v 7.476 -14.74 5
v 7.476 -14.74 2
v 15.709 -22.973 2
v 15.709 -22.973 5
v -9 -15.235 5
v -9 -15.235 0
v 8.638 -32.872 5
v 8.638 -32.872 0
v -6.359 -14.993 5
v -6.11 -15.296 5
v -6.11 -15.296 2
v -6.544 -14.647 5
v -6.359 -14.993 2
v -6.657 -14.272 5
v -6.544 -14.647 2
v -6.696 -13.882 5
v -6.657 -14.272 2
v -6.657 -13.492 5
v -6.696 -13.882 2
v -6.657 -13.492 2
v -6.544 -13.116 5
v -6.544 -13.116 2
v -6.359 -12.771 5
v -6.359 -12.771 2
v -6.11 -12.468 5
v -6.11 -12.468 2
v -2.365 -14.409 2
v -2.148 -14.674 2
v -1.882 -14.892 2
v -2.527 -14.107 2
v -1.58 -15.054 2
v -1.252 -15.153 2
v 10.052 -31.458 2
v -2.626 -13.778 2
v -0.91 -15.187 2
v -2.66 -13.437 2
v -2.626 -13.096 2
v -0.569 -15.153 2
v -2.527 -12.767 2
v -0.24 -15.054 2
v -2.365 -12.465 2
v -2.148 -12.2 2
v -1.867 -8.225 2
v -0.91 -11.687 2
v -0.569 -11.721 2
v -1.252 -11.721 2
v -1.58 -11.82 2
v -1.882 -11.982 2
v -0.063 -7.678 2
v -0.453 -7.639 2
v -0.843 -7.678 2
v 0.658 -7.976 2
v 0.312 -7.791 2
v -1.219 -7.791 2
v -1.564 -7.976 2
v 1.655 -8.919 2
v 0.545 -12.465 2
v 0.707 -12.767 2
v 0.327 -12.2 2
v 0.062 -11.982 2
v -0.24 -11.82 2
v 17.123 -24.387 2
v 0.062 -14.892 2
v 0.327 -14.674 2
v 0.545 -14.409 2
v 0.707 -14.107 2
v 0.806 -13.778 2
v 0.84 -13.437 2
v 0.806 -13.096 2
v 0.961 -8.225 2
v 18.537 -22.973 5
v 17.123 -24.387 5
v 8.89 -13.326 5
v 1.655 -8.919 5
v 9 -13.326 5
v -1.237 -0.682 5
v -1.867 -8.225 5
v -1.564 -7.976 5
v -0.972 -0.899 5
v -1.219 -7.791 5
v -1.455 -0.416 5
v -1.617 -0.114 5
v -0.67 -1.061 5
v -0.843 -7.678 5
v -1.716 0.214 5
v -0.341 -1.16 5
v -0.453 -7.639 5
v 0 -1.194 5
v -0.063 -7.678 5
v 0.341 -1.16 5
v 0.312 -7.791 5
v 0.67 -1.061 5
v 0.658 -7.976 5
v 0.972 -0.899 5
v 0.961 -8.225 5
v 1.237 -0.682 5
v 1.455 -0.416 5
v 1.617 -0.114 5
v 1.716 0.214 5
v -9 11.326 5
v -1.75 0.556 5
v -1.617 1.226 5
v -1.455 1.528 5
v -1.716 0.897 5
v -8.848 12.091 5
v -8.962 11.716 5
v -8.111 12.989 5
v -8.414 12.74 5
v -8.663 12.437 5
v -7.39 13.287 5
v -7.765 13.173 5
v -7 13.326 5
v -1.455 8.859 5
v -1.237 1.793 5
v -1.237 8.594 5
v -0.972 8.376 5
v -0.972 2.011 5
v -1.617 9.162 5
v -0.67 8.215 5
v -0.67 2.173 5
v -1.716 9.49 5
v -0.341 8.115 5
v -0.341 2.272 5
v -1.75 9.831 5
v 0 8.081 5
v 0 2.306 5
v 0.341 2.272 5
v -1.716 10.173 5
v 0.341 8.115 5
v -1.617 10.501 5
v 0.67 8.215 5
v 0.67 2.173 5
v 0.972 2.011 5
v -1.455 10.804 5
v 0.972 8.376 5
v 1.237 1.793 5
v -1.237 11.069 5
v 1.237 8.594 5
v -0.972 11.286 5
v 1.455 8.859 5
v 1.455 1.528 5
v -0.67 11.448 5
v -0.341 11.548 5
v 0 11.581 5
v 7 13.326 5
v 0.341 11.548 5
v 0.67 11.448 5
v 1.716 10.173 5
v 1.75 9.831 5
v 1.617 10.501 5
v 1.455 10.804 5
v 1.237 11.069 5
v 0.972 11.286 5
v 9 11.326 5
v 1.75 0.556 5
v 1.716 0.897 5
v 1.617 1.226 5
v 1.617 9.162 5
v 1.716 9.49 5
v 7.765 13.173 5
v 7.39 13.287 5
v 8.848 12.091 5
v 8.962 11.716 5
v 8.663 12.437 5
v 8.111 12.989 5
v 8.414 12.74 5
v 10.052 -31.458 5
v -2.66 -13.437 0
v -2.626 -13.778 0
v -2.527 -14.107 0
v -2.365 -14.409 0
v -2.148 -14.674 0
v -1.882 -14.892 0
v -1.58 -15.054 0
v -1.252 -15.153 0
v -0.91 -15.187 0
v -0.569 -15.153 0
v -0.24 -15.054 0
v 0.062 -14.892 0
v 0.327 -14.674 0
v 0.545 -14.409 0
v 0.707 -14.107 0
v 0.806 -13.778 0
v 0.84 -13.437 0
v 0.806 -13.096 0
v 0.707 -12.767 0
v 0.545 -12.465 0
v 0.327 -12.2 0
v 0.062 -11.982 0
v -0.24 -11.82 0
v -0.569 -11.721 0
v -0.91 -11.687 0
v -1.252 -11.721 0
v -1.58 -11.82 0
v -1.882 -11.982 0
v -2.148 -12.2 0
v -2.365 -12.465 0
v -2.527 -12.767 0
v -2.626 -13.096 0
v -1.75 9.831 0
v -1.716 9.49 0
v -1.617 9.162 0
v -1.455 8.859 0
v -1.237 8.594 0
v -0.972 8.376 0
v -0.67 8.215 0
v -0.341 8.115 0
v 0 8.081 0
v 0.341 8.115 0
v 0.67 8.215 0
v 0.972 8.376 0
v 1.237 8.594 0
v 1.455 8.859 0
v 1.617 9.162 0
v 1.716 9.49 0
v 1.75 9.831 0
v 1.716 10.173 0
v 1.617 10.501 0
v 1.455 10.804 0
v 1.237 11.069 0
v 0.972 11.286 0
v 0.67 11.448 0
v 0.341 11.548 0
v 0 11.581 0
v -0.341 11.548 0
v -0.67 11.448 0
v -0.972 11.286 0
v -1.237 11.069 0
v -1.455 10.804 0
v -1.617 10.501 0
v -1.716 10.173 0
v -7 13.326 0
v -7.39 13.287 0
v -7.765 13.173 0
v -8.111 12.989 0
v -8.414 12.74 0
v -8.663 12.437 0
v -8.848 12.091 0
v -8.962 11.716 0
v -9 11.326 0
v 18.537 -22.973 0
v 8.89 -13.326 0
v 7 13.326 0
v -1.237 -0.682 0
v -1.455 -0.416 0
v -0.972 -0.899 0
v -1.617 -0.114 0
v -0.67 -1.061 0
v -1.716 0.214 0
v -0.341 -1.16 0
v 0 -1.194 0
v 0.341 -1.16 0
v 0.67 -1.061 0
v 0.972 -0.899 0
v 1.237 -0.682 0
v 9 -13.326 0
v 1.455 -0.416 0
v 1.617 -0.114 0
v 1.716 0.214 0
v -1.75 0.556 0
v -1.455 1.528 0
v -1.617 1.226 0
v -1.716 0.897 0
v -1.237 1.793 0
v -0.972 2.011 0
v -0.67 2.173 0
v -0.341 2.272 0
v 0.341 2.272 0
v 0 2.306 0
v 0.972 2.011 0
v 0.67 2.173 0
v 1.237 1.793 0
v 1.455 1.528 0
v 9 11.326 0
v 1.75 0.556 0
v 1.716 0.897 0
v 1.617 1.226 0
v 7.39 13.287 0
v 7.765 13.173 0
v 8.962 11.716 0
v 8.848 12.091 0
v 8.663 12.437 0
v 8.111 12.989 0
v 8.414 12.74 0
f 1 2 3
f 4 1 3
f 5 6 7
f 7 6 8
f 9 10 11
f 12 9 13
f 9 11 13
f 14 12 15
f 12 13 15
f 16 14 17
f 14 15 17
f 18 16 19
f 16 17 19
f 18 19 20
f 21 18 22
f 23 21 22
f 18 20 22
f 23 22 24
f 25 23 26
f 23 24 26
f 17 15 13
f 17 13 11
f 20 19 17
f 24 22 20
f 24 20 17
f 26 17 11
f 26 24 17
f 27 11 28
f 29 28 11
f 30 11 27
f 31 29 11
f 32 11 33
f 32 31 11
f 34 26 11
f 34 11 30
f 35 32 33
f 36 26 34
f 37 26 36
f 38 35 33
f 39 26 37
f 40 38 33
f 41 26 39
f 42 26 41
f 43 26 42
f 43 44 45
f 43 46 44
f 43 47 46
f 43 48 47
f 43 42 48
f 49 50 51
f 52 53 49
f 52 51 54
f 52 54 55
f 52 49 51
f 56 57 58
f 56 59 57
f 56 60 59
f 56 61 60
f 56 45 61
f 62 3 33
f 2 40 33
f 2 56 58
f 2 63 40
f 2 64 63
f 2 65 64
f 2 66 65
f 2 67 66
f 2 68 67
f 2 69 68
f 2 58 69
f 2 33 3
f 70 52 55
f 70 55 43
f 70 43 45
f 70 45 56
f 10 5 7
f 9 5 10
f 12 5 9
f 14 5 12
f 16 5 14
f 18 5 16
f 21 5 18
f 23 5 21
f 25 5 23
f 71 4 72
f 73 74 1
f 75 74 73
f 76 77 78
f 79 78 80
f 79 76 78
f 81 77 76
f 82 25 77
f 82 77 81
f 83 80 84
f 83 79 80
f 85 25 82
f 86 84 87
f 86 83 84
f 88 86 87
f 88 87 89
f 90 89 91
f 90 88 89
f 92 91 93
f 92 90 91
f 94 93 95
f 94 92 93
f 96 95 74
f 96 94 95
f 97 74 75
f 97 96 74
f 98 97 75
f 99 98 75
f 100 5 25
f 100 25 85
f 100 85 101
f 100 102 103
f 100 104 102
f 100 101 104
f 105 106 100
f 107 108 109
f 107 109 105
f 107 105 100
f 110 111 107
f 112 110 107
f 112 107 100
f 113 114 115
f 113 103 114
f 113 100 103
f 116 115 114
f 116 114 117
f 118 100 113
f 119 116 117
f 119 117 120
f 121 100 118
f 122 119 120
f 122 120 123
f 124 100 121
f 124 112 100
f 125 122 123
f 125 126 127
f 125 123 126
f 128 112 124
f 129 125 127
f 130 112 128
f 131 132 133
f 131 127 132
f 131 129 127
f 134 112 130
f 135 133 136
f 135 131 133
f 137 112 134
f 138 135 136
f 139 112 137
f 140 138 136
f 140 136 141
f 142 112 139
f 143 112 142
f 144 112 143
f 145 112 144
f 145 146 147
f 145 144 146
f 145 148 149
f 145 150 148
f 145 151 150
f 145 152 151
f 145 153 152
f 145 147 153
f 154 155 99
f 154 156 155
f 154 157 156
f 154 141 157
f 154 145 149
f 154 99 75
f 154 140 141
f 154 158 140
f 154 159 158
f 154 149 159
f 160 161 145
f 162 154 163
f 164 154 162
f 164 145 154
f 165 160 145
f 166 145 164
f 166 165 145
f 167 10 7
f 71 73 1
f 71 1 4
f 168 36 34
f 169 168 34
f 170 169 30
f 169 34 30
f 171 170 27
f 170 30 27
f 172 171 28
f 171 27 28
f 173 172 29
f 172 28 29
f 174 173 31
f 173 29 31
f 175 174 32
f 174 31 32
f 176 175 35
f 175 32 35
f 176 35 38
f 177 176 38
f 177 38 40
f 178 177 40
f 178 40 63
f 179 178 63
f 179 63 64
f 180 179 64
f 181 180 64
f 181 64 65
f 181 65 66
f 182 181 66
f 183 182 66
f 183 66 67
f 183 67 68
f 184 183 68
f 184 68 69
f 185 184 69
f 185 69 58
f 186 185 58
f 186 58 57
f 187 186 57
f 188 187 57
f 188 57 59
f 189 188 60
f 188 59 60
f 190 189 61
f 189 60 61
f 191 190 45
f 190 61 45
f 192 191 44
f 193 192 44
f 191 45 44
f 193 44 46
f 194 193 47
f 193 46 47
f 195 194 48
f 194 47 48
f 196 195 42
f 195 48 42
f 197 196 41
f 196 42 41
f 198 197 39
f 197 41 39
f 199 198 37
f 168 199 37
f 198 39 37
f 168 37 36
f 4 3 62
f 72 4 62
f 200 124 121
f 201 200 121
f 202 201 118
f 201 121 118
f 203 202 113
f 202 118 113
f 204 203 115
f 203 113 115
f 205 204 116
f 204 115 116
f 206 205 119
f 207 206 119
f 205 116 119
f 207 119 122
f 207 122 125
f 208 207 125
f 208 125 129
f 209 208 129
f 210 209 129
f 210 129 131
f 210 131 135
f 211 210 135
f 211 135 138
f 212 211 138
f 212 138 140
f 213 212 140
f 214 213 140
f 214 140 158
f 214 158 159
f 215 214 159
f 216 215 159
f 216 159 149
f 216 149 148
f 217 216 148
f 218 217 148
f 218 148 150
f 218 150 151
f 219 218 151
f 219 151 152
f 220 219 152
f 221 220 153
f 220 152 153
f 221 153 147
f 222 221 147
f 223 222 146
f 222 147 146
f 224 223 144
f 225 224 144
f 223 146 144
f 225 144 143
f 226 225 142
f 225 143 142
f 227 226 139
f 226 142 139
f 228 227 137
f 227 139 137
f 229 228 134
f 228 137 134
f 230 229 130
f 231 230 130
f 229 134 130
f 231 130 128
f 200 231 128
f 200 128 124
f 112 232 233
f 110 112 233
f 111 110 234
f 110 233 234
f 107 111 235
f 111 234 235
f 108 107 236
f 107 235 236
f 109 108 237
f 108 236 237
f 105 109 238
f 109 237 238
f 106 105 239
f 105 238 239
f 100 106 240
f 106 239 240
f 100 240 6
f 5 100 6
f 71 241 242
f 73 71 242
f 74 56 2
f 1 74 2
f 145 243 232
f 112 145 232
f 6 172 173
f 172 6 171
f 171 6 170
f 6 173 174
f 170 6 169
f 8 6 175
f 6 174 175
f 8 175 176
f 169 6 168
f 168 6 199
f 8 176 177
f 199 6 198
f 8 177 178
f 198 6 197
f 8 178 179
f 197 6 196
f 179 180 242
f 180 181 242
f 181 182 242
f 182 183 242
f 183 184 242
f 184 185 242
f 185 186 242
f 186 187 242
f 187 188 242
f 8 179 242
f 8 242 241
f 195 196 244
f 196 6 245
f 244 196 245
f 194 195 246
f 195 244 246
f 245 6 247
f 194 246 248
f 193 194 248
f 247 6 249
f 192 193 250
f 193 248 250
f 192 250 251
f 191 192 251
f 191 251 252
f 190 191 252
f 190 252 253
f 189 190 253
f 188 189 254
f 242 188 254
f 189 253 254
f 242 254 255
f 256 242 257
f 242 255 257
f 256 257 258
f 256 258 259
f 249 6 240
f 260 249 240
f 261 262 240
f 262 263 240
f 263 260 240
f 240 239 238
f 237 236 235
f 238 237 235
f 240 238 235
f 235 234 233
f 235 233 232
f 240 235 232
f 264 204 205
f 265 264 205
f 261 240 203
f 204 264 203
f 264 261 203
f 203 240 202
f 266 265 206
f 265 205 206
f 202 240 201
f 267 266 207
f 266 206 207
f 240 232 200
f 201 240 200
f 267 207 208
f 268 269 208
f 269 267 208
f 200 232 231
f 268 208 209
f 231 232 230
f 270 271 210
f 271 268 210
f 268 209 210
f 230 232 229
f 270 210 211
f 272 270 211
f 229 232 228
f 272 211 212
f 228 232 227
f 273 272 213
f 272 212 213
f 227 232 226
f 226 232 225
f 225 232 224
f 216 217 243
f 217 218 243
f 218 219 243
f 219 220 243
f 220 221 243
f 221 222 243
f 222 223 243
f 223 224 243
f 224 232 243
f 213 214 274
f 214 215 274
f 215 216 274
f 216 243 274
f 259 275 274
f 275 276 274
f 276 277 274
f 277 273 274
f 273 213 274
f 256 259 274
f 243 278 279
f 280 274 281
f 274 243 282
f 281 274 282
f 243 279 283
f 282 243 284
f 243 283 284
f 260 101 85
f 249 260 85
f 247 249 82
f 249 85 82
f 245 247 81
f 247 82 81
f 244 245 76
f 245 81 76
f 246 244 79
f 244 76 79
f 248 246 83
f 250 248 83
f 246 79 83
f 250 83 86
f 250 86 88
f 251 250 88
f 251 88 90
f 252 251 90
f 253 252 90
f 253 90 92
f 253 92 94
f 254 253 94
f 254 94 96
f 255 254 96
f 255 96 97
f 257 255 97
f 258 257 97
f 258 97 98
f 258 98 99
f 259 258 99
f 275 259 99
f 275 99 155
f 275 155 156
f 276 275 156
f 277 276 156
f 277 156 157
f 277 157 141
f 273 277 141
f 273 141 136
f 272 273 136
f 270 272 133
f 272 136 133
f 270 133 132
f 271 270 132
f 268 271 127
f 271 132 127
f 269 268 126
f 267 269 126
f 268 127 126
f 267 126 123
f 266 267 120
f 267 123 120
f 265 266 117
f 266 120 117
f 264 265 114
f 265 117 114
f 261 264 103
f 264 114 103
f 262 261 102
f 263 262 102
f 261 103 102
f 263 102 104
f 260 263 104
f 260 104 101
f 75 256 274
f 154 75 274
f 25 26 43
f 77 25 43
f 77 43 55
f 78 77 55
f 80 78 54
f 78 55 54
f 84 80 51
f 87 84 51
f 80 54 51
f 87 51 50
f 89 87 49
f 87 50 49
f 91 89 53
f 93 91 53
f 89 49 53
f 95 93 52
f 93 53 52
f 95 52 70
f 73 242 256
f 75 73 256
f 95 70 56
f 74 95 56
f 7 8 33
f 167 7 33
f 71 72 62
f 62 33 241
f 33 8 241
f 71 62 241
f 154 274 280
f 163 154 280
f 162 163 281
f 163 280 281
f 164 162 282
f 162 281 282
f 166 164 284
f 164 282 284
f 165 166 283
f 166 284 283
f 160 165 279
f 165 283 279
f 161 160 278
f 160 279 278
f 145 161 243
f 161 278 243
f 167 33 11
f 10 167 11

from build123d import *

# Parameters (mm, degrees)
F1_DEPTH = 2
F2_DEPTH = 5
F3_D     = 3.5


with BuildPart() as f1:
    # F0 (on Top) → F1 (new body)
    with BuildSketch(Plane.XY):
        with BuildLine():
            Line((10.0519920066, -31.4581375476), (17.1230598185, -24.3870697357))
            Line((17.1230598185, -24.3870697357), (15.7088462561, -22.9728561734))
            Line((15.7088462561, -22.9728561734), (7.4758086988, -14.739818616))
            Line((7.4758086988, -14.739818616), (1.6548871607, -8.918897078))
            Line((1.6548871607, -8.918897078), (0.9610006781, -8.2250105953))
            ThreePointArc((0.9610006781, -8.2250105953), (-0.4532128843, -7.6392241577), (-1.8674264467, -8.2250105953))
            Line((-1.8674264467, -8.2250105953), (-6.1100671338, -12.4676512825))
            ThreePointArc((-6.1100671338, -12.4676512825), (-6.6958535714, -13.8818648448), (-6.1100671338, -15.2960784072))
            Line((-6.1100671338, -15.2960784072), (-4.0901436171, -17.3160019239))
            Line((-4.0901436171, -17.3160019239), (8.6377784442, -30.0439239852))
            Line((8.6377784442, -30.0439239852), (10.0519920066, -31.4581375476))
        make_face()
    extrude(amount=F1_DEPTH)

    # F0 (on Top) → F2 (join)
    with BuildSketch(Plane.XY):
        with BuildLine():
            Line((8.8900222611, -13.3256050537), (9, -13.3256050537))
            Line((9, -13.3256050537), (9, 11.3256050537))
            ThreePointArc((9, 11.3256050537), (8.4142135624, 12.739818616), (7, 13.3256050537))
            Line((7, 13.3256050537), (-7, 13.3256050537))
            ThreePointArc((-7, 13.3256050537), (-8.4142135624, 12.739818616), (-9, 11.3256050537))
            Line((-9, 11.3256050537), (-9, -13.3256050537))
            Line((-9, -13.3256050537), (-9, -15.2345726658))
            Line((-9, -15.2345726658), (-5.5043571795, -18.7302154863))
            Line((-5.5043571795, -18.7302154863), (8.6377784442, -32.87235111))
            Line((8.6377784442, -32.87235111), (10.0519920066, -31.4581375476))
            Line((10.0519920066, -31.4581375476), (8.6377784442, -30.0439239852))
            Line((8.6377784442, -30.0439239852), (-4.0901436171, -17.3160019239))
            Line((-4.0901436171, -17.3160019239), (-6.1100671338, -15.2960784072))
            ThreePointArc((-6.1100671338, -15.2960784072), (-6.6958535714, -13.8818648448), (-6.1100671338, -12.4676512825))
            Line((-6.1100671338, -12.4676512825), (-1.8674264467, -8.2250105953))
            ThreePointArc((-1.8674264467, -8.2250105953), (-0.4532128843, -7.6392241577), (0.9610006781, -8.2250105953))
            Line((0.9610006781, -8.2250105953), (1.6548871607, -8.918897078))
            Line((1.6548871607, -8.918897078), (7.4758086988, -14.739818616))
            Line((7.4758086988, -14.739818616), (15.7088462561, -22.9728561734))
            Line((15.7088462561, -22.9728561734), (17.1230598185, -24.3870697357))
            Line((17.1230598185, -24.3870697357), (18.5372733808, -22.9728561734))
            Line((18.5372733808, -22.9728561734), (8.8900222611, -13.3256050537))
        make_face()
    extrude(amount=F2_DEPTH)

    # F3 (through all)
    with Locations(Plane(origin=(0, 0, 0), x_dir=(1, 0, 0), z_dir=(0, 0, -1))):
        with Locations((0, -0.5559050478), (-0.9101199103, 13.4369833395), (0, -9.8313745111)):
            Hole(F3_D / 2)


solid = f1.part
